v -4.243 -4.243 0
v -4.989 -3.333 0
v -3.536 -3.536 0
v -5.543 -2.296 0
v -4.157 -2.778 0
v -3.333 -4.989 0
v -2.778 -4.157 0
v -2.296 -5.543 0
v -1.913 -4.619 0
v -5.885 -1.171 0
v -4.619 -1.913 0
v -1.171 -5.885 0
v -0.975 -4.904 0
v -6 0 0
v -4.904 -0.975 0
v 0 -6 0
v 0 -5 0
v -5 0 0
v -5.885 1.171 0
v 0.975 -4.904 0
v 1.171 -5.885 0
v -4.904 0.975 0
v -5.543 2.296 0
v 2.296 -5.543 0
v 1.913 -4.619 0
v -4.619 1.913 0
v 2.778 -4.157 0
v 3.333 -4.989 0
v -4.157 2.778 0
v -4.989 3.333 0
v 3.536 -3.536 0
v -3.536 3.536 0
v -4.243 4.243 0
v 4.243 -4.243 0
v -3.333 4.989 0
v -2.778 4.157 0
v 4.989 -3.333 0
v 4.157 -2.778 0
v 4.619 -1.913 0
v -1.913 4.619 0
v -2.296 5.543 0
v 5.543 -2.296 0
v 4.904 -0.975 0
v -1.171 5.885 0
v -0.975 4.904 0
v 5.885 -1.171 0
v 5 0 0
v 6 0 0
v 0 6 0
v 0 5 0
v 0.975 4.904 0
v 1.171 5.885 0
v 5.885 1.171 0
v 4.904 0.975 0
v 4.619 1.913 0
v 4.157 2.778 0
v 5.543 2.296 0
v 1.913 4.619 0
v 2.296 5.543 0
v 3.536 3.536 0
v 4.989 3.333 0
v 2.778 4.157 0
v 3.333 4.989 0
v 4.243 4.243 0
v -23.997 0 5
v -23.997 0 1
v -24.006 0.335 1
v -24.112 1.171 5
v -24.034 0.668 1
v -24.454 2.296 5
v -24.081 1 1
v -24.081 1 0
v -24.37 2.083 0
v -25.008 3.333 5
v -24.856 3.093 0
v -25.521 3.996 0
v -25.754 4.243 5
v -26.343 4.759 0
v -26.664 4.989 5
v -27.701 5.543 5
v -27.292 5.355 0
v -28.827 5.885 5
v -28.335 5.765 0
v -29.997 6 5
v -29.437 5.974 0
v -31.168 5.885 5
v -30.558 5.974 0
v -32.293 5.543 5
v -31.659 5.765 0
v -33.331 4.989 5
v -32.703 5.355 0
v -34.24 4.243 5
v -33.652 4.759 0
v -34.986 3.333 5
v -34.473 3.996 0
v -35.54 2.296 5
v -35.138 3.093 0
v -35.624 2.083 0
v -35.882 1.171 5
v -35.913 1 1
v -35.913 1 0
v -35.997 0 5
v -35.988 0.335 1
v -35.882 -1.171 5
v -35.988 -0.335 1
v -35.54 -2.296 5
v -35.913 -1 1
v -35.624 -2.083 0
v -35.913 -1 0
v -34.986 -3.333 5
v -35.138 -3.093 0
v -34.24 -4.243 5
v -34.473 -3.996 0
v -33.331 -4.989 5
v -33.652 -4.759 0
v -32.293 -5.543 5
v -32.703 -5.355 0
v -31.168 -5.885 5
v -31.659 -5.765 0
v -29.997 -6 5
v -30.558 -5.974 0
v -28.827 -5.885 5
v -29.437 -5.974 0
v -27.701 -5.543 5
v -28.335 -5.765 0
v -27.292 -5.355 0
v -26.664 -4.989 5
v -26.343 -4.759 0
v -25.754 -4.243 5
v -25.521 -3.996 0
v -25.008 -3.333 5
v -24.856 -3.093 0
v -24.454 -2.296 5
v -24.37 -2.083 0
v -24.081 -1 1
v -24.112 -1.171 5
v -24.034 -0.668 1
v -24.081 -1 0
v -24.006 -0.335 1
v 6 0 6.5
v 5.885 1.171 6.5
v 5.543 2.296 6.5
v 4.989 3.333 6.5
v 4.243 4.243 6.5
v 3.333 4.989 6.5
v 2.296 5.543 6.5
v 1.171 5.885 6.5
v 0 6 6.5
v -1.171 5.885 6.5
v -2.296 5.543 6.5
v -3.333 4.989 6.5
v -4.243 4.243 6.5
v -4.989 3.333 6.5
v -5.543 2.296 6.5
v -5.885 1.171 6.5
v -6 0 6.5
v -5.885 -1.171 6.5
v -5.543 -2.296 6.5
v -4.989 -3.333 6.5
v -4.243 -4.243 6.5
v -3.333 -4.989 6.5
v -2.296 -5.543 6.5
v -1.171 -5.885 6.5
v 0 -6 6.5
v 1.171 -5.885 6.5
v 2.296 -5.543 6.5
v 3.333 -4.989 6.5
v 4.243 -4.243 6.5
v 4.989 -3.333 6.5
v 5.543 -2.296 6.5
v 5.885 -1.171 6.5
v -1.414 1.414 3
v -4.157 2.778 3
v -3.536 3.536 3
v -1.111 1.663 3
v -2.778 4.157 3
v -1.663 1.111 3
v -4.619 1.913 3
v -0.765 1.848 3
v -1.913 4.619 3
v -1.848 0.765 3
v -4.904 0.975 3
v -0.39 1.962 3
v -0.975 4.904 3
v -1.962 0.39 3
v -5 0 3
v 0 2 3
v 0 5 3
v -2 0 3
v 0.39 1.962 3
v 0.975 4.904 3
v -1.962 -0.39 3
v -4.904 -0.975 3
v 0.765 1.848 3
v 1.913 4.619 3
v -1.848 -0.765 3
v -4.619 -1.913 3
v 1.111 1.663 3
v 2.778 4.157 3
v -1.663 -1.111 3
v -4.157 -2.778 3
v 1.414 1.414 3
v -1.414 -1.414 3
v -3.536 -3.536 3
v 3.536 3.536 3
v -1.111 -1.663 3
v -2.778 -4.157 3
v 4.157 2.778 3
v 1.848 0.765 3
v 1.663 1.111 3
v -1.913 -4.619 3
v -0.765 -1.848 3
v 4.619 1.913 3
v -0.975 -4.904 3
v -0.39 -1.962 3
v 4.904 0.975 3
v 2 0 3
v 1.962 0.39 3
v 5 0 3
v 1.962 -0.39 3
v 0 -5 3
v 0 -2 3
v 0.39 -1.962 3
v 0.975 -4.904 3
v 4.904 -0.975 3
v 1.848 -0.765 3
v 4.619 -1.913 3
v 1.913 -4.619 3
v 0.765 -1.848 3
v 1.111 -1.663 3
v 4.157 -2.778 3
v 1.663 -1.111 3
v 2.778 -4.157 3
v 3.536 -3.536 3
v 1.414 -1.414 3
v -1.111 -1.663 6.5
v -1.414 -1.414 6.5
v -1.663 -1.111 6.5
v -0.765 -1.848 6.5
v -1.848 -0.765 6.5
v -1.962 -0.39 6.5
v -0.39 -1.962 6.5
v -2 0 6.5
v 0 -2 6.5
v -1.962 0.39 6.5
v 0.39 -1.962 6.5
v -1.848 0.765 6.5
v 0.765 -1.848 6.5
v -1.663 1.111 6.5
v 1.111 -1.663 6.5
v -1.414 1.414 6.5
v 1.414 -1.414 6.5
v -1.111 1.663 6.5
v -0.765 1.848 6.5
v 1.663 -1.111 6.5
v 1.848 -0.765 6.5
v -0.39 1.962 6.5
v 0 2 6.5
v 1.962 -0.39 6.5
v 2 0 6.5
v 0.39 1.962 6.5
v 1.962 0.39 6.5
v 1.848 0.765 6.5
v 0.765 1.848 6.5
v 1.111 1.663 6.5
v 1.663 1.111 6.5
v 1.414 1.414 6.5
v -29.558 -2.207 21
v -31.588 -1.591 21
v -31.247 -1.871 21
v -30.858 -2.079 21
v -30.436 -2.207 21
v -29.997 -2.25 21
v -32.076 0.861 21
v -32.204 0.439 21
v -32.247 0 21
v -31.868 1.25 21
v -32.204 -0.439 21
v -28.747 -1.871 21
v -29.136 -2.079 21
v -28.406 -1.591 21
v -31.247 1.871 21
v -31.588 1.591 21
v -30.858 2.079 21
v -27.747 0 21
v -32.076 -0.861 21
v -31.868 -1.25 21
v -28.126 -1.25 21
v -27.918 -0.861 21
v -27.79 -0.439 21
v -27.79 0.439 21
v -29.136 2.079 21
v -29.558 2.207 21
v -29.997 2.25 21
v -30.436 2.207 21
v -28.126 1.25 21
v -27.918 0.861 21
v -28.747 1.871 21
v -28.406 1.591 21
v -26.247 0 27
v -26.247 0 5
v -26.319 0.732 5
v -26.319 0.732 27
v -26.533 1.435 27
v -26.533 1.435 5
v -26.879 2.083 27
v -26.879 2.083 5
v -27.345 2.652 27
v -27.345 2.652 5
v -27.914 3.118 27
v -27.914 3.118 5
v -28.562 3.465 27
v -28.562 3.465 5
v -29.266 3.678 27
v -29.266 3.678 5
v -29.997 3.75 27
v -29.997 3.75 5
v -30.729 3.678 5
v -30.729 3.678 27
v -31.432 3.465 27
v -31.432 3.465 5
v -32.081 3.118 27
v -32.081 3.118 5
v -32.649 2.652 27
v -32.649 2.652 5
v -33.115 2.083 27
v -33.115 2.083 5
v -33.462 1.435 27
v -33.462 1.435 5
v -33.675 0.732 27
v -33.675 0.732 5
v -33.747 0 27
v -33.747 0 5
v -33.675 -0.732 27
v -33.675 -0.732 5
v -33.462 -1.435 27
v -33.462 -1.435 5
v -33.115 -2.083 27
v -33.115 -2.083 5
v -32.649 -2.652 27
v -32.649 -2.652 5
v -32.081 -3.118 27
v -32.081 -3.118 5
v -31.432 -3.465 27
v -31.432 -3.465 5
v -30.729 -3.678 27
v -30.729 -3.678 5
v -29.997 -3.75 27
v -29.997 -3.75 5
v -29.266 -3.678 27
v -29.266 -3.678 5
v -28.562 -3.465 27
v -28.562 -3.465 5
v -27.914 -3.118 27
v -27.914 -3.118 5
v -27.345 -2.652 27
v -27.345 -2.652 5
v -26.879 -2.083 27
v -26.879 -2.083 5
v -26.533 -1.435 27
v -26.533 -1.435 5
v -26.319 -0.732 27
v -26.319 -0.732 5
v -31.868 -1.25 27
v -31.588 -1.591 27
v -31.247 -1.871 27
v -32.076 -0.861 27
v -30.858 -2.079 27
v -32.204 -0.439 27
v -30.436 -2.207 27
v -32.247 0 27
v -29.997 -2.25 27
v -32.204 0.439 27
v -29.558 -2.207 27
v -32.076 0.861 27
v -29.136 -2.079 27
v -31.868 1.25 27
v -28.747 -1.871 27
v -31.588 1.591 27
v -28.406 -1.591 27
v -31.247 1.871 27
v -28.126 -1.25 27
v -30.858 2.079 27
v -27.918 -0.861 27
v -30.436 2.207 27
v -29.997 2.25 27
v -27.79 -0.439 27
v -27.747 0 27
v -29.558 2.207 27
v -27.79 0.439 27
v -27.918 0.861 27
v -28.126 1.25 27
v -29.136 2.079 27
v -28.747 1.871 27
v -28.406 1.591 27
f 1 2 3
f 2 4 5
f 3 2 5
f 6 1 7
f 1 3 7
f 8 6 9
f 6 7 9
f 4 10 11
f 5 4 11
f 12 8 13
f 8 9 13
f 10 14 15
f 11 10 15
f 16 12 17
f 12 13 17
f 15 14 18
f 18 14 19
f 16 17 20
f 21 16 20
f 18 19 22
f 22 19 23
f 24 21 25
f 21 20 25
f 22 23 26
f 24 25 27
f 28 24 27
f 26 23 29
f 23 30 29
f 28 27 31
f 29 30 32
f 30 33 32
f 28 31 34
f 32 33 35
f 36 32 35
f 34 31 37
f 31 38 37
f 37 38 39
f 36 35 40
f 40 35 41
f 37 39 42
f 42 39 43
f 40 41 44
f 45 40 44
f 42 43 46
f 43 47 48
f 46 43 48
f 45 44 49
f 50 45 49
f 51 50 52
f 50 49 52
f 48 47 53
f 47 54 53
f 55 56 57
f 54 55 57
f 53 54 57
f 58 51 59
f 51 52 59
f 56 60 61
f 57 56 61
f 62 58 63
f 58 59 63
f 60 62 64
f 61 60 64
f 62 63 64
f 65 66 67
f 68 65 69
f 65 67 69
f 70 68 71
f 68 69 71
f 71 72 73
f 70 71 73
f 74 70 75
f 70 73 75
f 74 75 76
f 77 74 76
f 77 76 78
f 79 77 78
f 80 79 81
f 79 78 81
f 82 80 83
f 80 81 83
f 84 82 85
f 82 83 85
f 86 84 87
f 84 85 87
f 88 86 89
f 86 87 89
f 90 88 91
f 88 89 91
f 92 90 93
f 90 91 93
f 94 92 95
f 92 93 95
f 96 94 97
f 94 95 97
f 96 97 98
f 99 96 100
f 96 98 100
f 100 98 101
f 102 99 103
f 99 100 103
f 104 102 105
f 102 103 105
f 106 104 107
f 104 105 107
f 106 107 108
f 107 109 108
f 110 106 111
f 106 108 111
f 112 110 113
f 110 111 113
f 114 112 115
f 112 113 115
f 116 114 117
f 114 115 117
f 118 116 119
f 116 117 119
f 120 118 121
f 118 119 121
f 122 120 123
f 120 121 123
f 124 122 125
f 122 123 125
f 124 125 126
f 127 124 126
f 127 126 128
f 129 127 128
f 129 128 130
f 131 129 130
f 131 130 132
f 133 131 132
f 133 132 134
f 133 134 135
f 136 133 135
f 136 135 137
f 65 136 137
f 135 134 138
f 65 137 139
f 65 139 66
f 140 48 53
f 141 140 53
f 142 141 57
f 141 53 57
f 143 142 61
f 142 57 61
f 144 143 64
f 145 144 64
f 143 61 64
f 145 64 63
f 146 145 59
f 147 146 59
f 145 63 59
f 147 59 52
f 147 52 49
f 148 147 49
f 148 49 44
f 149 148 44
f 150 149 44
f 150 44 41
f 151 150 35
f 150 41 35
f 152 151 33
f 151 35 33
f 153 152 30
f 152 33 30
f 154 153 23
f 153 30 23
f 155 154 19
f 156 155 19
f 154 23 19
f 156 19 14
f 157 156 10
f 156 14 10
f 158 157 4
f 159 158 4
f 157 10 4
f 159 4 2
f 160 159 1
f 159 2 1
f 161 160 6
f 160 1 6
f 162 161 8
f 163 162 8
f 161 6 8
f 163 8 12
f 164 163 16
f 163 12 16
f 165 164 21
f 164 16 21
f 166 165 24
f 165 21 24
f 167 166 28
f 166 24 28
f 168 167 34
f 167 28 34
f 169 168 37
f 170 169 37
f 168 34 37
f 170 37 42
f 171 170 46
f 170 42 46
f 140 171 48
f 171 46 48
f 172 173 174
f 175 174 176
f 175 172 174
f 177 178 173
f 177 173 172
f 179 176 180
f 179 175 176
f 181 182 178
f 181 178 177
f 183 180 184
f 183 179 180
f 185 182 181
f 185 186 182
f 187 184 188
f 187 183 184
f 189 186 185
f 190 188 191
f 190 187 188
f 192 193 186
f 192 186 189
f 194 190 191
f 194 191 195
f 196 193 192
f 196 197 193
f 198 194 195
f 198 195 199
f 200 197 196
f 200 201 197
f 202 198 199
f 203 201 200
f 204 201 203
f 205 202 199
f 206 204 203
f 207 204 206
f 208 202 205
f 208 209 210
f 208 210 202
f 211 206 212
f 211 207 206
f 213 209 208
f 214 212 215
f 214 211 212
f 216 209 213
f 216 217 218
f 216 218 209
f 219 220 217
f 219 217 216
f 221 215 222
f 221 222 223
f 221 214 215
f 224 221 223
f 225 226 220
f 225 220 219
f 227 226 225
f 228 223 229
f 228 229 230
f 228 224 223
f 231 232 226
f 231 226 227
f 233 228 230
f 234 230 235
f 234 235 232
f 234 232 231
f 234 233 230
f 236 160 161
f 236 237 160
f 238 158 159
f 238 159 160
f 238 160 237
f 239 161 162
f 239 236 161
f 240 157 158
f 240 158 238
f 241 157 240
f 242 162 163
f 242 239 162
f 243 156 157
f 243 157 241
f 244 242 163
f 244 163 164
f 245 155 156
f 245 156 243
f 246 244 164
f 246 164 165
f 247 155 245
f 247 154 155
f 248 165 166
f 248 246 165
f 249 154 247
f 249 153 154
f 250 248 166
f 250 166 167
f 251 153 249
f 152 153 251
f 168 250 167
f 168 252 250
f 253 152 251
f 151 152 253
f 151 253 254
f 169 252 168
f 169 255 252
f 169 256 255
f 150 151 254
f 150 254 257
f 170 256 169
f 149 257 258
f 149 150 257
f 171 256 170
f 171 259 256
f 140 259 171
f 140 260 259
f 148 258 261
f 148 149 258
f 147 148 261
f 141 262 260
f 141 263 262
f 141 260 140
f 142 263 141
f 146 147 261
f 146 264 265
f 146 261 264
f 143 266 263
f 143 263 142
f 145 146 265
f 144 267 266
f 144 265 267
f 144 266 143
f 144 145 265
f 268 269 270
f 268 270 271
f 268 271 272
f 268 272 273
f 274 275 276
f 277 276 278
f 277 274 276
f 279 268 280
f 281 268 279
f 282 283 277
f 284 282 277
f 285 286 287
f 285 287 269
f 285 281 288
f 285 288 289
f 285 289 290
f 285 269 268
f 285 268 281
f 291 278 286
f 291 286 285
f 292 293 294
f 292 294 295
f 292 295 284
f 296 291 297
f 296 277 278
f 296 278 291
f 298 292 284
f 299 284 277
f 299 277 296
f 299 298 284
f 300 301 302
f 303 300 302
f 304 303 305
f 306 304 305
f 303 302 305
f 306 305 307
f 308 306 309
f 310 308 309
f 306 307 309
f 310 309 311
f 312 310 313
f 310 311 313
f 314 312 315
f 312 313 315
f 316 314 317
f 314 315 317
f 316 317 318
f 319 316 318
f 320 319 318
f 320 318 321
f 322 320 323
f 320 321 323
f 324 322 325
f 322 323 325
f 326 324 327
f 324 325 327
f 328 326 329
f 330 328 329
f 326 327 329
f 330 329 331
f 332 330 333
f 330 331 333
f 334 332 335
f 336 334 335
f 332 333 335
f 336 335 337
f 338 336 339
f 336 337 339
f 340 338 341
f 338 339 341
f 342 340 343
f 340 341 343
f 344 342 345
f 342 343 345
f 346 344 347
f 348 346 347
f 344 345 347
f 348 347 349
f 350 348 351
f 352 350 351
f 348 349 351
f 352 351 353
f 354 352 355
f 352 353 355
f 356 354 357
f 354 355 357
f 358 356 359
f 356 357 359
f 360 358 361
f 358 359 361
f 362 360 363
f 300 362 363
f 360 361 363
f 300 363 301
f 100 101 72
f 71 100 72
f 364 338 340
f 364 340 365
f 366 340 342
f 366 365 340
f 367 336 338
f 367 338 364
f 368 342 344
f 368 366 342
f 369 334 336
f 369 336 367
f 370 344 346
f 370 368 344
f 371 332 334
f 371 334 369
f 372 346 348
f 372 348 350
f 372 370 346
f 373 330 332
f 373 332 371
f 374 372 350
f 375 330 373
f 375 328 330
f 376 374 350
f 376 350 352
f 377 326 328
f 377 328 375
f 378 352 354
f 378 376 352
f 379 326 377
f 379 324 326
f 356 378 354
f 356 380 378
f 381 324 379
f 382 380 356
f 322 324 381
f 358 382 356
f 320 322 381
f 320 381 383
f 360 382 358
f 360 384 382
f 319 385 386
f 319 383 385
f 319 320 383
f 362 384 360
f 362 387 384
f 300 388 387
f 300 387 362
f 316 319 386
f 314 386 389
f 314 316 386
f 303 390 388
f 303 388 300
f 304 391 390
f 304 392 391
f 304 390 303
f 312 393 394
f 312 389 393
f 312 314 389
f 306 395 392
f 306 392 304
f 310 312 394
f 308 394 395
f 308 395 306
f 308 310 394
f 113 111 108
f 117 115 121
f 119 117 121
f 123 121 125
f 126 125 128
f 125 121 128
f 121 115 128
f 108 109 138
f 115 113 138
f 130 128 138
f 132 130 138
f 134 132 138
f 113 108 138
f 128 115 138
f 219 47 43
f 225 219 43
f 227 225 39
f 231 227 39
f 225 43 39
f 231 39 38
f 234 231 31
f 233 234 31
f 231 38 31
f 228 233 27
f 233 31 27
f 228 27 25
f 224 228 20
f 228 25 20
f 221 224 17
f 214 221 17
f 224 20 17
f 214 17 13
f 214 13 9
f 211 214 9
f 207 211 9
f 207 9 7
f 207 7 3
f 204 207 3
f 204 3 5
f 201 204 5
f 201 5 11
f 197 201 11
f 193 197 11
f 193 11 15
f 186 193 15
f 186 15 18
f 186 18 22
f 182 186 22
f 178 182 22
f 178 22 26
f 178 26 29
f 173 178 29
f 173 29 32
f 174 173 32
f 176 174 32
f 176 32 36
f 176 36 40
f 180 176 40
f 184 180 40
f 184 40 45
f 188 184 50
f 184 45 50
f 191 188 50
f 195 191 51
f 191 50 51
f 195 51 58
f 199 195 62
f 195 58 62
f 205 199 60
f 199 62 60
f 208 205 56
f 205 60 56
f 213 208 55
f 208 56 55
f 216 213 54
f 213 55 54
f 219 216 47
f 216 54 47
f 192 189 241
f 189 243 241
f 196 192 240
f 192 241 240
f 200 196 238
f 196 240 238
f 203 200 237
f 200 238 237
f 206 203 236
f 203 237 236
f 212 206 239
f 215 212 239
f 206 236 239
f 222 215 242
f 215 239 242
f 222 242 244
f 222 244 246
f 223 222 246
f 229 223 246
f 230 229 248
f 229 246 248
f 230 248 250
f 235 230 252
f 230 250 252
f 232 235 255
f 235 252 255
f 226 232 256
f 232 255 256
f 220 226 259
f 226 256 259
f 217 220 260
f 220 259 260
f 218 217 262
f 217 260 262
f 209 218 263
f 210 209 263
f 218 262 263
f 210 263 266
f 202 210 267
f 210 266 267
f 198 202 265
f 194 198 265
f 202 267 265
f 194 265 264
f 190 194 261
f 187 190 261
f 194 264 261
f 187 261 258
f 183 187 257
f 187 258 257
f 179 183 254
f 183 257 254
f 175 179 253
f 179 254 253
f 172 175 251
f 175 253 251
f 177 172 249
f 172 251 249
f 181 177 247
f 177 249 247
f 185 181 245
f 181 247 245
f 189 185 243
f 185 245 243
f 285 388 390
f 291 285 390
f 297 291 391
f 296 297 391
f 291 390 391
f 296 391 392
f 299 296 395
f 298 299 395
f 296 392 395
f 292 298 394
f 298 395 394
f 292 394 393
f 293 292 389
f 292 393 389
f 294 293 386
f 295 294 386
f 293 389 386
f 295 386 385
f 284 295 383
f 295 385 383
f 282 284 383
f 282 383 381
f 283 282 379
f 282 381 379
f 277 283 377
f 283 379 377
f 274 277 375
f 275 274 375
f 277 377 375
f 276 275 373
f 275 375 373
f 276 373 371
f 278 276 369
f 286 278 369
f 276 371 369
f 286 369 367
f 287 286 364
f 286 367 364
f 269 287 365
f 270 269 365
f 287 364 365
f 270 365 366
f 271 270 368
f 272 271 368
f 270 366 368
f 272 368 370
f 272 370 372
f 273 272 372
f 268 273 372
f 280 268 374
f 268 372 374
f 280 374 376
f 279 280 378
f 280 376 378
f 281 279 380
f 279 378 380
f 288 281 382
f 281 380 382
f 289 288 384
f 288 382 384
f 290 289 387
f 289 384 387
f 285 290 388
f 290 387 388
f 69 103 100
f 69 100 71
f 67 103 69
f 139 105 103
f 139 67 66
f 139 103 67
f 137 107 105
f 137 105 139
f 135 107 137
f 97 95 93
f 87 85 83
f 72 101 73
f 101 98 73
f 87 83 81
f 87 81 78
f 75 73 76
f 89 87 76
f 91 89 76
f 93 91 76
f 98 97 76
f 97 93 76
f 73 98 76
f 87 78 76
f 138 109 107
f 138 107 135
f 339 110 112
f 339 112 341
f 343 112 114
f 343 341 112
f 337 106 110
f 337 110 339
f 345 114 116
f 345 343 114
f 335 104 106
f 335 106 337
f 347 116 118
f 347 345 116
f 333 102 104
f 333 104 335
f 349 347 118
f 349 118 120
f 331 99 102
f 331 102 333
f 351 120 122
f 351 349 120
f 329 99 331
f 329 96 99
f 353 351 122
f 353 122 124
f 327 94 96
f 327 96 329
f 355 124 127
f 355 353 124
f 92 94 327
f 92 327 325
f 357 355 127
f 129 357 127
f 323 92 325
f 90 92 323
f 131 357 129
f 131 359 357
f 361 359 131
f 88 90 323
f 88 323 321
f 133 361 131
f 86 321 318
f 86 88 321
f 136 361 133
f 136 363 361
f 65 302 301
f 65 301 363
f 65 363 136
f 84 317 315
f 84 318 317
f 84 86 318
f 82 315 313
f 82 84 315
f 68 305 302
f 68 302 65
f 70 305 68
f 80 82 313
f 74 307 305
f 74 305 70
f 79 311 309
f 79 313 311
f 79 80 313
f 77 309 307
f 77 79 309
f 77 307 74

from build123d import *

# Parameters (mm, degrees)
F0_R            = 6
F1_DEPTH        = 6.5
F2_R            = 6
F3_DEPTH        = 5
F4_R            = 3.75
F5_DEPTH        = 22
F6_W            = 11.8321595662
F6_H            = 2
F7_DEPTH        = 1
F10_D           = 4
F10_CBORE_D     = 10
F10_CBORE_DEPTH = 3
F11_R           = 2.25
F12_DEPTH       = 6


with BuildPart() as f1:
    # F0 (on Top) → F1 (new body)
    with BuildSketch(Plane.XY):
        Circle(F0_R)
    extrude(amount=F1_DEPTH)

    # F10 (through all)
    with Locations(Plane(origin=(0, 0, 0), x_dir=(1, 0, 0), z_dir=(0, 0, -1))):
        with Locations((0, 0)):
            CounterBoreHole(F10_D / 2, F10_CBORE_D / 2, F10_CBORE_DEPTH)


with BuildPart() as f3:
    # F2 (on Top) → F3 (new body)
    with BuildSketch(Plane.XY):
        with Locations((-29.9971198939, 0)):
            Circle(F2_R)
    extrude(amount=F3_DEPTH)

    # F4 (on face) → F5 (join)
    with BuildSketch(Plane.XY.offset(5)):
        with Locations((-29.9971198939, 0)):
            Circle(F4_R)
    extrude(amount=F5_DEPTH)

    # F6 (on face) → F7 (cut)
    with BuildSketch(Plane(origin=(0, 0, 0), x_dir=(1, 0, 0), z_dir=(0, 0, -1))):
        with BuildLine():
            Line((-35.913199677, -1), (-35.913199677, 1))
            ThreePointArc((-35.913199677, 1), (-35.9971198939, 0), (-35.913199677, -1))
        make_face()
        with Locations((-29.9971198939, 0)):
            Rectangle(F6_W, F6_H)
        with BuildLine():
            ThreePointArc((-23.9971198939, 0), (-24.0181367572, 0.5017575617), (-24.0810401108, 1))
            Line((-24.0810401108, 1), (-24.0810401108, -1))
            ThreePointArc((-24.0810401108, -1), (-24.0181367572, -0.5017575617), (-23.9971198939, 0))
        make_face()
    extrude(amount=-F7_DEPTH, mode=Mode.SUBTRACT)

    # F11 (on face) → F12 (cut)
    with BuildSketch(Plane.XY.offset(27)):
        with Locations((-29.9971198939, 0)):
            Circle(F11_R)
    extrude(amount=-F12_DEPTH, mode=Mode.SUBTRACT)


solid = Compound([f1.part, f3.part])
